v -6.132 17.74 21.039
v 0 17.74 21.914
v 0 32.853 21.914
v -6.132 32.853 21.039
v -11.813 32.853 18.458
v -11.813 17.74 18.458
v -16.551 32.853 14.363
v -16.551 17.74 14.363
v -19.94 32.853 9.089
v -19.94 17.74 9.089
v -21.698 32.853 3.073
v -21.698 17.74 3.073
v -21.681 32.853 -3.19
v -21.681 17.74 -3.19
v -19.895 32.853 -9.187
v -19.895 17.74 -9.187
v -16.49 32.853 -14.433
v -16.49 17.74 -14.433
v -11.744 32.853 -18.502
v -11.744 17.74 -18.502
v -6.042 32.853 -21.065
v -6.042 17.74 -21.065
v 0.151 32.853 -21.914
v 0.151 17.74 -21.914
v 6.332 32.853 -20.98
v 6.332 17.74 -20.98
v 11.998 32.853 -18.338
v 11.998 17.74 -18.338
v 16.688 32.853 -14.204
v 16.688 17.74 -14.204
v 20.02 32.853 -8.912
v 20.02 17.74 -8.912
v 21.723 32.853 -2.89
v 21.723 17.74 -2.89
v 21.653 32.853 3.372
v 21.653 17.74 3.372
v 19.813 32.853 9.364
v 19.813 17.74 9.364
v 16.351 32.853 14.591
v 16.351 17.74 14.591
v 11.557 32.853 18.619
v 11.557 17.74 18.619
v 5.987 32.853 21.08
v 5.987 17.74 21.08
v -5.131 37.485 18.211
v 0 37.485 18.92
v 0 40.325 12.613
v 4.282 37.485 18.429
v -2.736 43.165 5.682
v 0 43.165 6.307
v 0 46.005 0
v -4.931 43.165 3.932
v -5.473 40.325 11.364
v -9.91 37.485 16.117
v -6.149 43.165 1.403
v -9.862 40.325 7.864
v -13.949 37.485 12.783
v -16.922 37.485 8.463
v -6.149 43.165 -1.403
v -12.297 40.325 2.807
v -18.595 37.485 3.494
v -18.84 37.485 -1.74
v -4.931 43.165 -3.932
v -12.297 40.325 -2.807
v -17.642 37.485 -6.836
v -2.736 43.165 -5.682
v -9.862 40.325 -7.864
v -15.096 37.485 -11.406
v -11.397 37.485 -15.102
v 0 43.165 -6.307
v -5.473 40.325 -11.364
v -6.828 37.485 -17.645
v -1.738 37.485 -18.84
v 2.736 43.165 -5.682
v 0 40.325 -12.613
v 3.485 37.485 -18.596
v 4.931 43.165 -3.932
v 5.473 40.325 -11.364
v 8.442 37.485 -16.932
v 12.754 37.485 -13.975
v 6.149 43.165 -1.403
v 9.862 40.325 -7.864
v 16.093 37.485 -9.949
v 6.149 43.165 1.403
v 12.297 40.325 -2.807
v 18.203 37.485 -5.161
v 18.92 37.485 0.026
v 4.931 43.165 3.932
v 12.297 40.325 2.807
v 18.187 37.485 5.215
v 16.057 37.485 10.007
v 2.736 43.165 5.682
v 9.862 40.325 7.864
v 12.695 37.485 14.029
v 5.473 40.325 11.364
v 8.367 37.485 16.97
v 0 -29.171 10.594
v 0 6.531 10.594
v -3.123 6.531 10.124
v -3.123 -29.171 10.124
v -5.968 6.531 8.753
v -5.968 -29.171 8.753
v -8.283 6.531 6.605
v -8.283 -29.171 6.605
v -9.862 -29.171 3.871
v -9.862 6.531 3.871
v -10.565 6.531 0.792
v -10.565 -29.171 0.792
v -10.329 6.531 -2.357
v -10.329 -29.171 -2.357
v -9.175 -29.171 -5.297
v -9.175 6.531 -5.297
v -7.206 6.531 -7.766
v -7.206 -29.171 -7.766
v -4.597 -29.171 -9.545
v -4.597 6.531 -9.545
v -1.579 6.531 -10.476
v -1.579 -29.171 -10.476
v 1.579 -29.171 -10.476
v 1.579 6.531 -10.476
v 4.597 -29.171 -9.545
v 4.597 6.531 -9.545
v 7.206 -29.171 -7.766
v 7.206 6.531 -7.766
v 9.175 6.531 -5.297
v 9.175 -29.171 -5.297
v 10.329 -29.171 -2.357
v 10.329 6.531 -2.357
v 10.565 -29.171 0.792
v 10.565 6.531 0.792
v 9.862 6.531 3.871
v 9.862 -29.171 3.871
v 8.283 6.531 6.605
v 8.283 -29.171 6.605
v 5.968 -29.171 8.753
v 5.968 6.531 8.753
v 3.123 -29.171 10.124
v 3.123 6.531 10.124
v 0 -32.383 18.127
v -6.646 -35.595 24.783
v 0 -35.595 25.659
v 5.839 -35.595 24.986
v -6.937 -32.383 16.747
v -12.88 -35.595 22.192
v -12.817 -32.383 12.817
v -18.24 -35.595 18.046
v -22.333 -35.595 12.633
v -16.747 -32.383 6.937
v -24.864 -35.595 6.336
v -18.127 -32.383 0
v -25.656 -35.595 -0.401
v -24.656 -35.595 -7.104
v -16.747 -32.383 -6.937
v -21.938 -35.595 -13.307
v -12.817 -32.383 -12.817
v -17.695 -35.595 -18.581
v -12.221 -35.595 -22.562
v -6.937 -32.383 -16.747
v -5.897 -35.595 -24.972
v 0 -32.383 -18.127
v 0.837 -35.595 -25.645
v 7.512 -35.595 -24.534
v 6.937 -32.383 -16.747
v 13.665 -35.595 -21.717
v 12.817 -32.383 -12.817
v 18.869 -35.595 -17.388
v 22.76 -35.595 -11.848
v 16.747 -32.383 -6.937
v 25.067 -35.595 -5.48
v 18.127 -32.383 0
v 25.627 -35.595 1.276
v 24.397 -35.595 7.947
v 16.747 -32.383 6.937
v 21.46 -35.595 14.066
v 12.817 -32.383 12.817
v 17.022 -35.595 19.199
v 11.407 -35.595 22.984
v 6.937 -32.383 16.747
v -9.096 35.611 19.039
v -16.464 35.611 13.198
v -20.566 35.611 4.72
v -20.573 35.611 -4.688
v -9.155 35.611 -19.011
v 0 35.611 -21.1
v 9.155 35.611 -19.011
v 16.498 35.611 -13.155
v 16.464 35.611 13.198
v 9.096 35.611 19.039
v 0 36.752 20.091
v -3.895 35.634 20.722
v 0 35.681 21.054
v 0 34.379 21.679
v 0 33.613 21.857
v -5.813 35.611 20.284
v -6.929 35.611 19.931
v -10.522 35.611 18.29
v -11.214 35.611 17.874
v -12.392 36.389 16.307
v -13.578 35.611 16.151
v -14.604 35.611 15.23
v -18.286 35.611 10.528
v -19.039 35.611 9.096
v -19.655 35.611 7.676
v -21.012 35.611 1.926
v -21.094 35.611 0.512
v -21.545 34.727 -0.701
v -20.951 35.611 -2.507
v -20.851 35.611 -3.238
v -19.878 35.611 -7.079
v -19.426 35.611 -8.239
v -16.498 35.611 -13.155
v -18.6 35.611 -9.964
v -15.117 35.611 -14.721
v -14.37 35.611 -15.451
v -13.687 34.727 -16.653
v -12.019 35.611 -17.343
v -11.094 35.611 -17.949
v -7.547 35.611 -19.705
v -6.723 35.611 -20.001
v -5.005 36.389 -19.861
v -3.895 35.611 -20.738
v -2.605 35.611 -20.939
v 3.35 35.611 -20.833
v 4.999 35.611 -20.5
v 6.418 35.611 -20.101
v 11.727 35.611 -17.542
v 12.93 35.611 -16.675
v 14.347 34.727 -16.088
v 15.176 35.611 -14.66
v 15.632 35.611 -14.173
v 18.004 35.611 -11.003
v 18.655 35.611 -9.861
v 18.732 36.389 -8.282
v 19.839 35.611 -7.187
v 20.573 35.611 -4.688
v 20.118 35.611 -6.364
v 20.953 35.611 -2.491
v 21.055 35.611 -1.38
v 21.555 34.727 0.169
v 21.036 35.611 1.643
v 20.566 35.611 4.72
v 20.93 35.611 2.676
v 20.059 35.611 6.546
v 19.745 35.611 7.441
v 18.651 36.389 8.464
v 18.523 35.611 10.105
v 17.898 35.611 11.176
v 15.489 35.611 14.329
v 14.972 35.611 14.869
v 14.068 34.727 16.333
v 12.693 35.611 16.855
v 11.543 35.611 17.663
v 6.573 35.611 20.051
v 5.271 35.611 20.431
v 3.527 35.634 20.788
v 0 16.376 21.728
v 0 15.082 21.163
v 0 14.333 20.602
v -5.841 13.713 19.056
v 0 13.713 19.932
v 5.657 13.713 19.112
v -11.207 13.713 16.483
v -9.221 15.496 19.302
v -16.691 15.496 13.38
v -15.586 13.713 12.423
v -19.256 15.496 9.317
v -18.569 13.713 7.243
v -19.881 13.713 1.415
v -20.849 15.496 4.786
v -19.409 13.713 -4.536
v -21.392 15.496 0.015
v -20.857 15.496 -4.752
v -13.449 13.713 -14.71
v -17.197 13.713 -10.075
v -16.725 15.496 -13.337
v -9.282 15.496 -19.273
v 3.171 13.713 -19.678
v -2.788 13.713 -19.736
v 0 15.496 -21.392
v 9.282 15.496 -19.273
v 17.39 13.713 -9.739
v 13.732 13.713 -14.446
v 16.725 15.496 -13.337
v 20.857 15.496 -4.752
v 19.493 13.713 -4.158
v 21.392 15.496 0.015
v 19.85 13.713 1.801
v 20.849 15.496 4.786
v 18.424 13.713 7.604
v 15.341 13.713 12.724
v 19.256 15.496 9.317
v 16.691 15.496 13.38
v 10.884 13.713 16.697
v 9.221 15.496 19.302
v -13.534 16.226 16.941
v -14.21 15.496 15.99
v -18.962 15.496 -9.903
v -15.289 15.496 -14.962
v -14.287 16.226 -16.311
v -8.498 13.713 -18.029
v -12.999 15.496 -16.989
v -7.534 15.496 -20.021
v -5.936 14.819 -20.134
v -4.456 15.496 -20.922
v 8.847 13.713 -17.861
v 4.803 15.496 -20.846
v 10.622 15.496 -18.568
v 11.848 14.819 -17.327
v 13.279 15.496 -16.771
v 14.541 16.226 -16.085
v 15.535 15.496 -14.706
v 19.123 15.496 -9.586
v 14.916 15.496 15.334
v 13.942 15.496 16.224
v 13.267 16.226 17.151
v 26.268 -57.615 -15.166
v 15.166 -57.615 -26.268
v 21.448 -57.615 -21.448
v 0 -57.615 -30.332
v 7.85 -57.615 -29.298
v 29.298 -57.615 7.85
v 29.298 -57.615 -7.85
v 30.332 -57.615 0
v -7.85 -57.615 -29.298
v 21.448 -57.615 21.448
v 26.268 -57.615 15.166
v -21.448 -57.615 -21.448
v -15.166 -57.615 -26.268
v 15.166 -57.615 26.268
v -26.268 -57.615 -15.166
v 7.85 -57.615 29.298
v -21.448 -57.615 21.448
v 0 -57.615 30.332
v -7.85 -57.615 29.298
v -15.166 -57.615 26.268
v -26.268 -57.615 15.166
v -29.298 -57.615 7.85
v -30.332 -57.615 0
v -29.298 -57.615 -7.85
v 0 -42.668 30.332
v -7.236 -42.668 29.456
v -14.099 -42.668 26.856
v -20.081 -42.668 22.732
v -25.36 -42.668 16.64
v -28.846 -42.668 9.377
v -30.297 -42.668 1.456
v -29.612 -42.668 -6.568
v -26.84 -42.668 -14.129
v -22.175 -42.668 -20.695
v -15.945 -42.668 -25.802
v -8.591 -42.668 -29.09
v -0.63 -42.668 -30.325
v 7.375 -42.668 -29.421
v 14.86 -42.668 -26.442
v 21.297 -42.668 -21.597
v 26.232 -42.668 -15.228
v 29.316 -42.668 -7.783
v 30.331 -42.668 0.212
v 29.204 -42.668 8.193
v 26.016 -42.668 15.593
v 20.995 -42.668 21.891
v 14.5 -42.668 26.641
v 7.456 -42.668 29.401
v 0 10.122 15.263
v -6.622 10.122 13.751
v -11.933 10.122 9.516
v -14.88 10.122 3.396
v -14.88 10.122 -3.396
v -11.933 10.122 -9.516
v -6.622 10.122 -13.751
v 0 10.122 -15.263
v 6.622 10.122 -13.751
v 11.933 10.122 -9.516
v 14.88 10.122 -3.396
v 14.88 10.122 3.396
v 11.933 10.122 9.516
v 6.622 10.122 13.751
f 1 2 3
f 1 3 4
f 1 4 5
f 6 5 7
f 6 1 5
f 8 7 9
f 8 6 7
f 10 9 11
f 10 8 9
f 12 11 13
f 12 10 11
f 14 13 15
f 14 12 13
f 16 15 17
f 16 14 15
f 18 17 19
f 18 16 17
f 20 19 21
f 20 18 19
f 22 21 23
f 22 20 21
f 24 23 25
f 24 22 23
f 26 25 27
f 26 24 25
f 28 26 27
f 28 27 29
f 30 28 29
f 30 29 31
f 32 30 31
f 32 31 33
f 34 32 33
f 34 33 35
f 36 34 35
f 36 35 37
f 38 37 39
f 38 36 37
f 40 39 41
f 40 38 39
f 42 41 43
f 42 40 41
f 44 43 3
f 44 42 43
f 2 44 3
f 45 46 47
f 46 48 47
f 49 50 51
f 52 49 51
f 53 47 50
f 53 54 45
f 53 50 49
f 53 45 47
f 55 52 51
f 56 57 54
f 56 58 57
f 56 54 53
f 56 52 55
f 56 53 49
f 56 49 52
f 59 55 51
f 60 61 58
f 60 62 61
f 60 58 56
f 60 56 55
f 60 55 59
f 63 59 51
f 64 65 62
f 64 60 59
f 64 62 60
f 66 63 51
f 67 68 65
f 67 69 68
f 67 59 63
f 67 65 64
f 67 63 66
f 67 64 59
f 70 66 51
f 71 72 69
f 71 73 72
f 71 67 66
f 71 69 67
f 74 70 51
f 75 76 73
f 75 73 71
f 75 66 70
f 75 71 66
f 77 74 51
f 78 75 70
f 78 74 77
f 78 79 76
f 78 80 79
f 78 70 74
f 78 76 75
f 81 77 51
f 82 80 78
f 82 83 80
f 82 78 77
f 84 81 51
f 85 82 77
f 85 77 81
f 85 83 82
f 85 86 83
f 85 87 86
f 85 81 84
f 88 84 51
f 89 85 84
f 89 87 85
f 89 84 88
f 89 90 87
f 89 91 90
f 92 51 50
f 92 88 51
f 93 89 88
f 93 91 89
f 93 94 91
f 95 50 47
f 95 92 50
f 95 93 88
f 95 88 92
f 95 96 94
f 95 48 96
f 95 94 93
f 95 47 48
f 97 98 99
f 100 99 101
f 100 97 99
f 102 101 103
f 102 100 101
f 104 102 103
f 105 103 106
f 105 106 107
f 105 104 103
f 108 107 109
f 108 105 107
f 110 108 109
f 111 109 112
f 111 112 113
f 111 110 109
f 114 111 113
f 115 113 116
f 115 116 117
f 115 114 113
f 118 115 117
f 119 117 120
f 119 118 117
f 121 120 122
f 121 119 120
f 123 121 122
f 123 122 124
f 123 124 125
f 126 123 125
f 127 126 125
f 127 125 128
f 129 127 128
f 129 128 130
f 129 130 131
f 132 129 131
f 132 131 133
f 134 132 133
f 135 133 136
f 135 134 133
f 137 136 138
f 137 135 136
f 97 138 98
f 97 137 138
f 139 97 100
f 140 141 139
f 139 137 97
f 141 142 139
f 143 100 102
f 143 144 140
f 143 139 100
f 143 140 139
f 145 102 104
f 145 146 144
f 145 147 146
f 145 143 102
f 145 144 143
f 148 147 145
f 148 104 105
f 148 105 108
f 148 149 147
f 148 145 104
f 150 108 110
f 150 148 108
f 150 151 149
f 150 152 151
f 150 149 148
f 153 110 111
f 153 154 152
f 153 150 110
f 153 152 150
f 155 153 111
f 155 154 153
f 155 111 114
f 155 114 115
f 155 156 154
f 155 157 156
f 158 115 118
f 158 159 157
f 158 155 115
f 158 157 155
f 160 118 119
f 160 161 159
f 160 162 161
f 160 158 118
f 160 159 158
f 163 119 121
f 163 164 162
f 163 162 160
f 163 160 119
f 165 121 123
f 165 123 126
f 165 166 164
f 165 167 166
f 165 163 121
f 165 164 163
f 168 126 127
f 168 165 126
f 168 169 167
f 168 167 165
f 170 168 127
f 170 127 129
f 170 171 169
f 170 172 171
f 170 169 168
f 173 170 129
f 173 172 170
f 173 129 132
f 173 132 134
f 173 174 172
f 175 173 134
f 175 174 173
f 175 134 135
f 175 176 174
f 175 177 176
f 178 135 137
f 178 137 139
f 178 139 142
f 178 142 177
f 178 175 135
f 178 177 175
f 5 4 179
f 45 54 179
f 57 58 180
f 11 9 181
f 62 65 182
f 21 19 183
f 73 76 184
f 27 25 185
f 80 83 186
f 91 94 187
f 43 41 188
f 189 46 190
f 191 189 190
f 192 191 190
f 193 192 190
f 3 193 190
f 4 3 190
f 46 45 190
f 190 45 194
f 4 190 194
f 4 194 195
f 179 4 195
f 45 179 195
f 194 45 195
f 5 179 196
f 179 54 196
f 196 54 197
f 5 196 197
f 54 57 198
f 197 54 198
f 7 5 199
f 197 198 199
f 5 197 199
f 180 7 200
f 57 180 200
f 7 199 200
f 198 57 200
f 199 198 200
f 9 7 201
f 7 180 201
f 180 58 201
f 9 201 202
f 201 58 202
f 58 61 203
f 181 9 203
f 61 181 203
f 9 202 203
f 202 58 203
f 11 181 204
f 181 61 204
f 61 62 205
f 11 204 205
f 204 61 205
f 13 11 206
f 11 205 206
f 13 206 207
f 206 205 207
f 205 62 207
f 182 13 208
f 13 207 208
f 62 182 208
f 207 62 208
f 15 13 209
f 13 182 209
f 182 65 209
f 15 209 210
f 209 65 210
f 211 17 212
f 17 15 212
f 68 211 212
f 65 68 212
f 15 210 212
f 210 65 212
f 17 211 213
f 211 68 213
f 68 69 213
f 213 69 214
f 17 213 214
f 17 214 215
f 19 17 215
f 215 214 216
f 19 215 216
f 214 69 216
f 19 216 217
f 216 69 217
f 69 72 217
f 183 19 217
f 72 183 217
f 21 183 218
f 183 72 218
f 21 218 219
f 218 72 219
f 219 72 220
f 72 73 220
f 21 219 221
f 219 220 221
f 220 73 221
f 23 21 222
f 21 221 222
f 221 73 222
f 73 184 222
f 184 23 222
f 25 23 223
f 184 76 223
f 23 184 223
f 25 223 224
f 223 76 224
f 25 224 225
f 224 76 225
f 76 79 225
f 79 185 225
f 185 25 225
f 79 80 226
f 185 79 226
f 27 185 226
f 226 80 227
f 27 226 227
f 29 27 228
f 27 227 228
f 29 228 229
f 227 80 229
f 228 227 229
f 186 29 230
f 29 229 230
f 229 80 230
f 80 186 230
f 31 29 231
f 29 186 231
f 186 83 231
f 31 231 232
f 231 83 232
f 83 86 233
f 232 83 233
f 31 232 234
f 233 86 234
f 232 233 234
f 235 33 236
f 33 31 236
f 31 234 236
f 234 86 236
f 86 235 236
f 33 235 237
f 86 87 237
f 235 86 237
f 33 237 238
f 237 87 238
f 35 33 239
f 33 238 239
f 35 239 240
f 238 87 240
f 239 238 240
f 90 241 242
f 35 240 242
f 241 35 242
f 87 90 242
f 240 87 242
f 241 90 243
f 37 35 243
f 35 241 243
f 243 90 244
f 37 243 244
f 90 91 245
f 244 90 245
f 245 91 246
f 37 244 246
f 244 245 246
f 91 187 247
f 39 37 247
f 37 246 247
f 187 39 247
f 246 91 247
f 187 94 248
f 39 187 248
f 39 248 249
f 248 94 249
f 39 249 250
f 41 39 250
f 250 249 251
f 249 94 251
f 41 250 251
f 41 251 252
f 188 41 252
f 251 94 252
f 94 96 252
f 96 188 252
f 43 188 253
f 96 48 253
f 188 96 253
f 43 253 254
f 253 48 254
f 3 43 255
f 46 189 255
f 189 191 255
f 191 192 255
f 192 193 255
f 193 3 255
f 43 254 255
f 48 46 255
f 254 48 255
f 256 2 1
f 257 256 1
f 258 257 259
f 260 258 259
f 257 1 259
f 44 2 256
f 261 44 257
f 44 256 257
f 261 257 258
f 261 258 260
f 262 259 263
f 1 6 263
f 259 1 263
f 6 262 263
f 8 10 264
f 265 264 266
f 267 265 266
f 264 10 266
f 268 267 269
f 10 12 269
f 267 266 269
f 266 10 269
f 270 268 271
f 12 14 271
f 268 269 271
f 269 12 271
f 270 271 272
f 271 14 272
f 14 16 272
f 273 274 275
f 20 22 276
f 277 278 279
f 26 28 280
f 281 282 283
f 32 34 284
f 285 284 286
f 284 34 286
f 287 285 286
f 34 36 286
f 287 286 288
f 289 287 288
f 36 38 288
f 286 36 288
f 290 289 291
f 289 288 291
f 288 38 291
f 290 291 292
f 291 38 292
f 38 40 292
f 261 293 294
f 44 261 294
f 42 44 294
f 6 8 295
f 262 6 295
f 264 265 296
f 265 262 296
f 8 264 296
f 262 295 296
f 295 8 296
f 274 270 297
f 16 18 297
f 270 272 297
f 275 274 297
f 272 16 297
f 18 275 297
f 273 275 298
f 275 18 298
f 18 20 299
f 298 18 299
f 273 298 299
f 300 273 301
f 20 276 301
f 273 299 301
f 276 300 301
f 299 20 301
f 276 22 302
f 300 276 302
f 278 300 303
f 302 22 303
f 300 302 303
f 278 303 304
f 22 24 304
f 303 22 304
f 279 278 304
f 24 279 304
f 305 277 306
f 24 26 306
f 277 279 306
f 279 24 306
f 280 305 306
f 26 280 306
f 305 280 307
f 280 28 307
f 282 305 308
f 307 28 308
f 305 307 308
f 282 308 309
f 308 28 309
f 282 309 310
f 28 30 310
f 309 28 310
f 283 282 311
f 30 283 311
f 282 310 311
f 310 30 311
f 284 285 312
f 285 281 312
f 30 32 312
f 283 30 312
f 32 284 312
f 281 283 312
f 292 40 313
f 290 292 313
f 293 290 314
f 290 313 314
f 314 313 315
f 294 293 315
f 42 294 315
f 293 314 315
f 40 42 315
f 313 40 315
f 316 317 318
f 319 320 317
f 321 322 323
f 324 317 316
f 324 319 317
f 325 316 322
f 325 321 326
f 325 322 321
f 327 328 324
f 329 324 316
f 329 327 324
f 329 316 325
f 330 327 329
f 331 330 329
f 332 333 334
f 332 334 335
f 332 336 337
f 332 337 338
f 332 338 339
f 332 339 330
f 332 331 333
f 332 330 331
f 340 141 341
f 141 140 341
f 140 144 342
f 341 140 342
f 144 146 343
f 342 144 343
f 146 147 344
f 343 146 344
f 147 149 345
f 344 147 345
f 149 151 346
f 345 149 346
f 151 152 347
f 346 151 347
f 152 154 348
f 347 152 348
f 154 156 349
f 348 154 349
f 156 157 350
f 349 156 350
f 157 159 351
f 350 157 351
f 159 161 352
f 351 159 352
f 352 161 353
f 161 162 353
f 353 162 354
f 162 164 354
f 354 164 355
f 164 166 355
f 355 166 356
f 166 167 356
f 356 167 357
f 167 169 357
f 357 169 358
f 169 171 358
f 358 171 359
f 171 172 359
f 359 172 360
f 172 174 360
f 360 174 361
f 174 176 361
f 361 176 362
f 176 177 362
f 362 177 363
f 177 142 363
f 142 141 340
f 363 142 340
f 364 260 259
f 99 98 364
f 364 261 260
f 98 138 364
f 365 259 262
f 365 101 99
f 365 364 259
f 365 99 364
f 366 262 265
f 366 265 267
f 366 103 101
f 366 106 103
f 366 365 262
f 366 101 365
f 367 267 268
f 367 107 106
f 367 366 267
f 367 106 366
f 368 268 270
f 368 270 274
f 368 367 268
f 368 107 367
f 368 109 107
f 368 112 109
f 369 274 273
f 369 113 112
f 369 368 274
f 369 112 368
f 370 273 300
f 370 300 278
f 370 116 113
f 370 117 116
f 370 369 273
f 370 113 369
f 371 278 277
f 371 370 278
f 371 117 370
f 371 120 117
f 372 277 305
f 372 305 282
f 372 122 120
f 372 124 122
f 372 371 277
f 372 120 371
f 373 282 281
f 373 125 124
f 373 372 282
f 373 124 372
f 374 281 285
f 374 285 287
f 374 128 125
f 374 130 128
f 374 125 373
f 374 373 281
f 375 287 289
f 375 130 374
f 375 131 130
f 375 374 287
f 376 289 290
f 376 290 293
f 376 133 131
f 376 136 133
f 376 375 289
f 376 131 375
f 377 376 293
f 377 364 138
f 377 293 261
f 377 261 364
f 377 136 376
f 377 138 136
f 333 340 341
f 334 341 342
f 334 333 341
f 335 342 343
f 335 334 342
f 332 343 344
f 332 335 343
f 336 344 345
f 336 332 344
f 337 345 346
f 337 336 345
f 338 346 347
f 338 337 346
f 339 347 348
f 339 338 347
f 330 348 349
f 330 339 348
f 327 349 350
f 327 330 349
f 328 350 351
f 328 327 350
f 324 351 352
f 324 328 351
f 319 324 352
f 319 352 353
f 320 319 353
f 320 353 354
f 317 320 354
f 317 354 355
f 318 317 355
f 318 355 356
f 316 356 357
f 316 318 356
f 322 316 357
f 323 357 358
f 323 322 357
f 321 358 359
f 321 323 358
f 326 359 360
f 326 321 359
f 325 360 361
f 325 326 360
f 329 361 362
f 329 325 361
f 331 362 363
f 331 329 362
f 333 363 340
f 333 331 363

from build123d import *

# Parameters (mm, degrees)
F2_R    = 5.08
F3_SIZE = 5.08


with BuildPart() as f1:
    # F0 (on Right) → F1 (revolve)
    with BuildSketch(Plane.YZ):
        Polygon((-57.615455, 0), (46.00529, 0), (36.136646, 21.914188), (15.238347, 21.914188), (6.530722, 10.594275), (-29.170545, 10.594275), (-37.587918, 30.331559), (-57.615455, 30.331559), align=None)
    revolve(axis=Axis((0, 3.918434, 0), (0, -1, 0)))

    # F2
    f2_edges = [f1.edges().sort_by_distance(p)[0] for p in [
        (0, 36.136646, -21.914188),
        (0, 15.238347, -21.914188),
    ]]
    fillet(f2_edges, radius=F2_R)

    # F3
    f3_edges = [f1.edges().sort_by_distance(p)[0] for p in [
        (0, -37.587918, -30.331559),
    ]]
    chamfer(f3_edges, length=F3_SIZE)


solid = f1.part
